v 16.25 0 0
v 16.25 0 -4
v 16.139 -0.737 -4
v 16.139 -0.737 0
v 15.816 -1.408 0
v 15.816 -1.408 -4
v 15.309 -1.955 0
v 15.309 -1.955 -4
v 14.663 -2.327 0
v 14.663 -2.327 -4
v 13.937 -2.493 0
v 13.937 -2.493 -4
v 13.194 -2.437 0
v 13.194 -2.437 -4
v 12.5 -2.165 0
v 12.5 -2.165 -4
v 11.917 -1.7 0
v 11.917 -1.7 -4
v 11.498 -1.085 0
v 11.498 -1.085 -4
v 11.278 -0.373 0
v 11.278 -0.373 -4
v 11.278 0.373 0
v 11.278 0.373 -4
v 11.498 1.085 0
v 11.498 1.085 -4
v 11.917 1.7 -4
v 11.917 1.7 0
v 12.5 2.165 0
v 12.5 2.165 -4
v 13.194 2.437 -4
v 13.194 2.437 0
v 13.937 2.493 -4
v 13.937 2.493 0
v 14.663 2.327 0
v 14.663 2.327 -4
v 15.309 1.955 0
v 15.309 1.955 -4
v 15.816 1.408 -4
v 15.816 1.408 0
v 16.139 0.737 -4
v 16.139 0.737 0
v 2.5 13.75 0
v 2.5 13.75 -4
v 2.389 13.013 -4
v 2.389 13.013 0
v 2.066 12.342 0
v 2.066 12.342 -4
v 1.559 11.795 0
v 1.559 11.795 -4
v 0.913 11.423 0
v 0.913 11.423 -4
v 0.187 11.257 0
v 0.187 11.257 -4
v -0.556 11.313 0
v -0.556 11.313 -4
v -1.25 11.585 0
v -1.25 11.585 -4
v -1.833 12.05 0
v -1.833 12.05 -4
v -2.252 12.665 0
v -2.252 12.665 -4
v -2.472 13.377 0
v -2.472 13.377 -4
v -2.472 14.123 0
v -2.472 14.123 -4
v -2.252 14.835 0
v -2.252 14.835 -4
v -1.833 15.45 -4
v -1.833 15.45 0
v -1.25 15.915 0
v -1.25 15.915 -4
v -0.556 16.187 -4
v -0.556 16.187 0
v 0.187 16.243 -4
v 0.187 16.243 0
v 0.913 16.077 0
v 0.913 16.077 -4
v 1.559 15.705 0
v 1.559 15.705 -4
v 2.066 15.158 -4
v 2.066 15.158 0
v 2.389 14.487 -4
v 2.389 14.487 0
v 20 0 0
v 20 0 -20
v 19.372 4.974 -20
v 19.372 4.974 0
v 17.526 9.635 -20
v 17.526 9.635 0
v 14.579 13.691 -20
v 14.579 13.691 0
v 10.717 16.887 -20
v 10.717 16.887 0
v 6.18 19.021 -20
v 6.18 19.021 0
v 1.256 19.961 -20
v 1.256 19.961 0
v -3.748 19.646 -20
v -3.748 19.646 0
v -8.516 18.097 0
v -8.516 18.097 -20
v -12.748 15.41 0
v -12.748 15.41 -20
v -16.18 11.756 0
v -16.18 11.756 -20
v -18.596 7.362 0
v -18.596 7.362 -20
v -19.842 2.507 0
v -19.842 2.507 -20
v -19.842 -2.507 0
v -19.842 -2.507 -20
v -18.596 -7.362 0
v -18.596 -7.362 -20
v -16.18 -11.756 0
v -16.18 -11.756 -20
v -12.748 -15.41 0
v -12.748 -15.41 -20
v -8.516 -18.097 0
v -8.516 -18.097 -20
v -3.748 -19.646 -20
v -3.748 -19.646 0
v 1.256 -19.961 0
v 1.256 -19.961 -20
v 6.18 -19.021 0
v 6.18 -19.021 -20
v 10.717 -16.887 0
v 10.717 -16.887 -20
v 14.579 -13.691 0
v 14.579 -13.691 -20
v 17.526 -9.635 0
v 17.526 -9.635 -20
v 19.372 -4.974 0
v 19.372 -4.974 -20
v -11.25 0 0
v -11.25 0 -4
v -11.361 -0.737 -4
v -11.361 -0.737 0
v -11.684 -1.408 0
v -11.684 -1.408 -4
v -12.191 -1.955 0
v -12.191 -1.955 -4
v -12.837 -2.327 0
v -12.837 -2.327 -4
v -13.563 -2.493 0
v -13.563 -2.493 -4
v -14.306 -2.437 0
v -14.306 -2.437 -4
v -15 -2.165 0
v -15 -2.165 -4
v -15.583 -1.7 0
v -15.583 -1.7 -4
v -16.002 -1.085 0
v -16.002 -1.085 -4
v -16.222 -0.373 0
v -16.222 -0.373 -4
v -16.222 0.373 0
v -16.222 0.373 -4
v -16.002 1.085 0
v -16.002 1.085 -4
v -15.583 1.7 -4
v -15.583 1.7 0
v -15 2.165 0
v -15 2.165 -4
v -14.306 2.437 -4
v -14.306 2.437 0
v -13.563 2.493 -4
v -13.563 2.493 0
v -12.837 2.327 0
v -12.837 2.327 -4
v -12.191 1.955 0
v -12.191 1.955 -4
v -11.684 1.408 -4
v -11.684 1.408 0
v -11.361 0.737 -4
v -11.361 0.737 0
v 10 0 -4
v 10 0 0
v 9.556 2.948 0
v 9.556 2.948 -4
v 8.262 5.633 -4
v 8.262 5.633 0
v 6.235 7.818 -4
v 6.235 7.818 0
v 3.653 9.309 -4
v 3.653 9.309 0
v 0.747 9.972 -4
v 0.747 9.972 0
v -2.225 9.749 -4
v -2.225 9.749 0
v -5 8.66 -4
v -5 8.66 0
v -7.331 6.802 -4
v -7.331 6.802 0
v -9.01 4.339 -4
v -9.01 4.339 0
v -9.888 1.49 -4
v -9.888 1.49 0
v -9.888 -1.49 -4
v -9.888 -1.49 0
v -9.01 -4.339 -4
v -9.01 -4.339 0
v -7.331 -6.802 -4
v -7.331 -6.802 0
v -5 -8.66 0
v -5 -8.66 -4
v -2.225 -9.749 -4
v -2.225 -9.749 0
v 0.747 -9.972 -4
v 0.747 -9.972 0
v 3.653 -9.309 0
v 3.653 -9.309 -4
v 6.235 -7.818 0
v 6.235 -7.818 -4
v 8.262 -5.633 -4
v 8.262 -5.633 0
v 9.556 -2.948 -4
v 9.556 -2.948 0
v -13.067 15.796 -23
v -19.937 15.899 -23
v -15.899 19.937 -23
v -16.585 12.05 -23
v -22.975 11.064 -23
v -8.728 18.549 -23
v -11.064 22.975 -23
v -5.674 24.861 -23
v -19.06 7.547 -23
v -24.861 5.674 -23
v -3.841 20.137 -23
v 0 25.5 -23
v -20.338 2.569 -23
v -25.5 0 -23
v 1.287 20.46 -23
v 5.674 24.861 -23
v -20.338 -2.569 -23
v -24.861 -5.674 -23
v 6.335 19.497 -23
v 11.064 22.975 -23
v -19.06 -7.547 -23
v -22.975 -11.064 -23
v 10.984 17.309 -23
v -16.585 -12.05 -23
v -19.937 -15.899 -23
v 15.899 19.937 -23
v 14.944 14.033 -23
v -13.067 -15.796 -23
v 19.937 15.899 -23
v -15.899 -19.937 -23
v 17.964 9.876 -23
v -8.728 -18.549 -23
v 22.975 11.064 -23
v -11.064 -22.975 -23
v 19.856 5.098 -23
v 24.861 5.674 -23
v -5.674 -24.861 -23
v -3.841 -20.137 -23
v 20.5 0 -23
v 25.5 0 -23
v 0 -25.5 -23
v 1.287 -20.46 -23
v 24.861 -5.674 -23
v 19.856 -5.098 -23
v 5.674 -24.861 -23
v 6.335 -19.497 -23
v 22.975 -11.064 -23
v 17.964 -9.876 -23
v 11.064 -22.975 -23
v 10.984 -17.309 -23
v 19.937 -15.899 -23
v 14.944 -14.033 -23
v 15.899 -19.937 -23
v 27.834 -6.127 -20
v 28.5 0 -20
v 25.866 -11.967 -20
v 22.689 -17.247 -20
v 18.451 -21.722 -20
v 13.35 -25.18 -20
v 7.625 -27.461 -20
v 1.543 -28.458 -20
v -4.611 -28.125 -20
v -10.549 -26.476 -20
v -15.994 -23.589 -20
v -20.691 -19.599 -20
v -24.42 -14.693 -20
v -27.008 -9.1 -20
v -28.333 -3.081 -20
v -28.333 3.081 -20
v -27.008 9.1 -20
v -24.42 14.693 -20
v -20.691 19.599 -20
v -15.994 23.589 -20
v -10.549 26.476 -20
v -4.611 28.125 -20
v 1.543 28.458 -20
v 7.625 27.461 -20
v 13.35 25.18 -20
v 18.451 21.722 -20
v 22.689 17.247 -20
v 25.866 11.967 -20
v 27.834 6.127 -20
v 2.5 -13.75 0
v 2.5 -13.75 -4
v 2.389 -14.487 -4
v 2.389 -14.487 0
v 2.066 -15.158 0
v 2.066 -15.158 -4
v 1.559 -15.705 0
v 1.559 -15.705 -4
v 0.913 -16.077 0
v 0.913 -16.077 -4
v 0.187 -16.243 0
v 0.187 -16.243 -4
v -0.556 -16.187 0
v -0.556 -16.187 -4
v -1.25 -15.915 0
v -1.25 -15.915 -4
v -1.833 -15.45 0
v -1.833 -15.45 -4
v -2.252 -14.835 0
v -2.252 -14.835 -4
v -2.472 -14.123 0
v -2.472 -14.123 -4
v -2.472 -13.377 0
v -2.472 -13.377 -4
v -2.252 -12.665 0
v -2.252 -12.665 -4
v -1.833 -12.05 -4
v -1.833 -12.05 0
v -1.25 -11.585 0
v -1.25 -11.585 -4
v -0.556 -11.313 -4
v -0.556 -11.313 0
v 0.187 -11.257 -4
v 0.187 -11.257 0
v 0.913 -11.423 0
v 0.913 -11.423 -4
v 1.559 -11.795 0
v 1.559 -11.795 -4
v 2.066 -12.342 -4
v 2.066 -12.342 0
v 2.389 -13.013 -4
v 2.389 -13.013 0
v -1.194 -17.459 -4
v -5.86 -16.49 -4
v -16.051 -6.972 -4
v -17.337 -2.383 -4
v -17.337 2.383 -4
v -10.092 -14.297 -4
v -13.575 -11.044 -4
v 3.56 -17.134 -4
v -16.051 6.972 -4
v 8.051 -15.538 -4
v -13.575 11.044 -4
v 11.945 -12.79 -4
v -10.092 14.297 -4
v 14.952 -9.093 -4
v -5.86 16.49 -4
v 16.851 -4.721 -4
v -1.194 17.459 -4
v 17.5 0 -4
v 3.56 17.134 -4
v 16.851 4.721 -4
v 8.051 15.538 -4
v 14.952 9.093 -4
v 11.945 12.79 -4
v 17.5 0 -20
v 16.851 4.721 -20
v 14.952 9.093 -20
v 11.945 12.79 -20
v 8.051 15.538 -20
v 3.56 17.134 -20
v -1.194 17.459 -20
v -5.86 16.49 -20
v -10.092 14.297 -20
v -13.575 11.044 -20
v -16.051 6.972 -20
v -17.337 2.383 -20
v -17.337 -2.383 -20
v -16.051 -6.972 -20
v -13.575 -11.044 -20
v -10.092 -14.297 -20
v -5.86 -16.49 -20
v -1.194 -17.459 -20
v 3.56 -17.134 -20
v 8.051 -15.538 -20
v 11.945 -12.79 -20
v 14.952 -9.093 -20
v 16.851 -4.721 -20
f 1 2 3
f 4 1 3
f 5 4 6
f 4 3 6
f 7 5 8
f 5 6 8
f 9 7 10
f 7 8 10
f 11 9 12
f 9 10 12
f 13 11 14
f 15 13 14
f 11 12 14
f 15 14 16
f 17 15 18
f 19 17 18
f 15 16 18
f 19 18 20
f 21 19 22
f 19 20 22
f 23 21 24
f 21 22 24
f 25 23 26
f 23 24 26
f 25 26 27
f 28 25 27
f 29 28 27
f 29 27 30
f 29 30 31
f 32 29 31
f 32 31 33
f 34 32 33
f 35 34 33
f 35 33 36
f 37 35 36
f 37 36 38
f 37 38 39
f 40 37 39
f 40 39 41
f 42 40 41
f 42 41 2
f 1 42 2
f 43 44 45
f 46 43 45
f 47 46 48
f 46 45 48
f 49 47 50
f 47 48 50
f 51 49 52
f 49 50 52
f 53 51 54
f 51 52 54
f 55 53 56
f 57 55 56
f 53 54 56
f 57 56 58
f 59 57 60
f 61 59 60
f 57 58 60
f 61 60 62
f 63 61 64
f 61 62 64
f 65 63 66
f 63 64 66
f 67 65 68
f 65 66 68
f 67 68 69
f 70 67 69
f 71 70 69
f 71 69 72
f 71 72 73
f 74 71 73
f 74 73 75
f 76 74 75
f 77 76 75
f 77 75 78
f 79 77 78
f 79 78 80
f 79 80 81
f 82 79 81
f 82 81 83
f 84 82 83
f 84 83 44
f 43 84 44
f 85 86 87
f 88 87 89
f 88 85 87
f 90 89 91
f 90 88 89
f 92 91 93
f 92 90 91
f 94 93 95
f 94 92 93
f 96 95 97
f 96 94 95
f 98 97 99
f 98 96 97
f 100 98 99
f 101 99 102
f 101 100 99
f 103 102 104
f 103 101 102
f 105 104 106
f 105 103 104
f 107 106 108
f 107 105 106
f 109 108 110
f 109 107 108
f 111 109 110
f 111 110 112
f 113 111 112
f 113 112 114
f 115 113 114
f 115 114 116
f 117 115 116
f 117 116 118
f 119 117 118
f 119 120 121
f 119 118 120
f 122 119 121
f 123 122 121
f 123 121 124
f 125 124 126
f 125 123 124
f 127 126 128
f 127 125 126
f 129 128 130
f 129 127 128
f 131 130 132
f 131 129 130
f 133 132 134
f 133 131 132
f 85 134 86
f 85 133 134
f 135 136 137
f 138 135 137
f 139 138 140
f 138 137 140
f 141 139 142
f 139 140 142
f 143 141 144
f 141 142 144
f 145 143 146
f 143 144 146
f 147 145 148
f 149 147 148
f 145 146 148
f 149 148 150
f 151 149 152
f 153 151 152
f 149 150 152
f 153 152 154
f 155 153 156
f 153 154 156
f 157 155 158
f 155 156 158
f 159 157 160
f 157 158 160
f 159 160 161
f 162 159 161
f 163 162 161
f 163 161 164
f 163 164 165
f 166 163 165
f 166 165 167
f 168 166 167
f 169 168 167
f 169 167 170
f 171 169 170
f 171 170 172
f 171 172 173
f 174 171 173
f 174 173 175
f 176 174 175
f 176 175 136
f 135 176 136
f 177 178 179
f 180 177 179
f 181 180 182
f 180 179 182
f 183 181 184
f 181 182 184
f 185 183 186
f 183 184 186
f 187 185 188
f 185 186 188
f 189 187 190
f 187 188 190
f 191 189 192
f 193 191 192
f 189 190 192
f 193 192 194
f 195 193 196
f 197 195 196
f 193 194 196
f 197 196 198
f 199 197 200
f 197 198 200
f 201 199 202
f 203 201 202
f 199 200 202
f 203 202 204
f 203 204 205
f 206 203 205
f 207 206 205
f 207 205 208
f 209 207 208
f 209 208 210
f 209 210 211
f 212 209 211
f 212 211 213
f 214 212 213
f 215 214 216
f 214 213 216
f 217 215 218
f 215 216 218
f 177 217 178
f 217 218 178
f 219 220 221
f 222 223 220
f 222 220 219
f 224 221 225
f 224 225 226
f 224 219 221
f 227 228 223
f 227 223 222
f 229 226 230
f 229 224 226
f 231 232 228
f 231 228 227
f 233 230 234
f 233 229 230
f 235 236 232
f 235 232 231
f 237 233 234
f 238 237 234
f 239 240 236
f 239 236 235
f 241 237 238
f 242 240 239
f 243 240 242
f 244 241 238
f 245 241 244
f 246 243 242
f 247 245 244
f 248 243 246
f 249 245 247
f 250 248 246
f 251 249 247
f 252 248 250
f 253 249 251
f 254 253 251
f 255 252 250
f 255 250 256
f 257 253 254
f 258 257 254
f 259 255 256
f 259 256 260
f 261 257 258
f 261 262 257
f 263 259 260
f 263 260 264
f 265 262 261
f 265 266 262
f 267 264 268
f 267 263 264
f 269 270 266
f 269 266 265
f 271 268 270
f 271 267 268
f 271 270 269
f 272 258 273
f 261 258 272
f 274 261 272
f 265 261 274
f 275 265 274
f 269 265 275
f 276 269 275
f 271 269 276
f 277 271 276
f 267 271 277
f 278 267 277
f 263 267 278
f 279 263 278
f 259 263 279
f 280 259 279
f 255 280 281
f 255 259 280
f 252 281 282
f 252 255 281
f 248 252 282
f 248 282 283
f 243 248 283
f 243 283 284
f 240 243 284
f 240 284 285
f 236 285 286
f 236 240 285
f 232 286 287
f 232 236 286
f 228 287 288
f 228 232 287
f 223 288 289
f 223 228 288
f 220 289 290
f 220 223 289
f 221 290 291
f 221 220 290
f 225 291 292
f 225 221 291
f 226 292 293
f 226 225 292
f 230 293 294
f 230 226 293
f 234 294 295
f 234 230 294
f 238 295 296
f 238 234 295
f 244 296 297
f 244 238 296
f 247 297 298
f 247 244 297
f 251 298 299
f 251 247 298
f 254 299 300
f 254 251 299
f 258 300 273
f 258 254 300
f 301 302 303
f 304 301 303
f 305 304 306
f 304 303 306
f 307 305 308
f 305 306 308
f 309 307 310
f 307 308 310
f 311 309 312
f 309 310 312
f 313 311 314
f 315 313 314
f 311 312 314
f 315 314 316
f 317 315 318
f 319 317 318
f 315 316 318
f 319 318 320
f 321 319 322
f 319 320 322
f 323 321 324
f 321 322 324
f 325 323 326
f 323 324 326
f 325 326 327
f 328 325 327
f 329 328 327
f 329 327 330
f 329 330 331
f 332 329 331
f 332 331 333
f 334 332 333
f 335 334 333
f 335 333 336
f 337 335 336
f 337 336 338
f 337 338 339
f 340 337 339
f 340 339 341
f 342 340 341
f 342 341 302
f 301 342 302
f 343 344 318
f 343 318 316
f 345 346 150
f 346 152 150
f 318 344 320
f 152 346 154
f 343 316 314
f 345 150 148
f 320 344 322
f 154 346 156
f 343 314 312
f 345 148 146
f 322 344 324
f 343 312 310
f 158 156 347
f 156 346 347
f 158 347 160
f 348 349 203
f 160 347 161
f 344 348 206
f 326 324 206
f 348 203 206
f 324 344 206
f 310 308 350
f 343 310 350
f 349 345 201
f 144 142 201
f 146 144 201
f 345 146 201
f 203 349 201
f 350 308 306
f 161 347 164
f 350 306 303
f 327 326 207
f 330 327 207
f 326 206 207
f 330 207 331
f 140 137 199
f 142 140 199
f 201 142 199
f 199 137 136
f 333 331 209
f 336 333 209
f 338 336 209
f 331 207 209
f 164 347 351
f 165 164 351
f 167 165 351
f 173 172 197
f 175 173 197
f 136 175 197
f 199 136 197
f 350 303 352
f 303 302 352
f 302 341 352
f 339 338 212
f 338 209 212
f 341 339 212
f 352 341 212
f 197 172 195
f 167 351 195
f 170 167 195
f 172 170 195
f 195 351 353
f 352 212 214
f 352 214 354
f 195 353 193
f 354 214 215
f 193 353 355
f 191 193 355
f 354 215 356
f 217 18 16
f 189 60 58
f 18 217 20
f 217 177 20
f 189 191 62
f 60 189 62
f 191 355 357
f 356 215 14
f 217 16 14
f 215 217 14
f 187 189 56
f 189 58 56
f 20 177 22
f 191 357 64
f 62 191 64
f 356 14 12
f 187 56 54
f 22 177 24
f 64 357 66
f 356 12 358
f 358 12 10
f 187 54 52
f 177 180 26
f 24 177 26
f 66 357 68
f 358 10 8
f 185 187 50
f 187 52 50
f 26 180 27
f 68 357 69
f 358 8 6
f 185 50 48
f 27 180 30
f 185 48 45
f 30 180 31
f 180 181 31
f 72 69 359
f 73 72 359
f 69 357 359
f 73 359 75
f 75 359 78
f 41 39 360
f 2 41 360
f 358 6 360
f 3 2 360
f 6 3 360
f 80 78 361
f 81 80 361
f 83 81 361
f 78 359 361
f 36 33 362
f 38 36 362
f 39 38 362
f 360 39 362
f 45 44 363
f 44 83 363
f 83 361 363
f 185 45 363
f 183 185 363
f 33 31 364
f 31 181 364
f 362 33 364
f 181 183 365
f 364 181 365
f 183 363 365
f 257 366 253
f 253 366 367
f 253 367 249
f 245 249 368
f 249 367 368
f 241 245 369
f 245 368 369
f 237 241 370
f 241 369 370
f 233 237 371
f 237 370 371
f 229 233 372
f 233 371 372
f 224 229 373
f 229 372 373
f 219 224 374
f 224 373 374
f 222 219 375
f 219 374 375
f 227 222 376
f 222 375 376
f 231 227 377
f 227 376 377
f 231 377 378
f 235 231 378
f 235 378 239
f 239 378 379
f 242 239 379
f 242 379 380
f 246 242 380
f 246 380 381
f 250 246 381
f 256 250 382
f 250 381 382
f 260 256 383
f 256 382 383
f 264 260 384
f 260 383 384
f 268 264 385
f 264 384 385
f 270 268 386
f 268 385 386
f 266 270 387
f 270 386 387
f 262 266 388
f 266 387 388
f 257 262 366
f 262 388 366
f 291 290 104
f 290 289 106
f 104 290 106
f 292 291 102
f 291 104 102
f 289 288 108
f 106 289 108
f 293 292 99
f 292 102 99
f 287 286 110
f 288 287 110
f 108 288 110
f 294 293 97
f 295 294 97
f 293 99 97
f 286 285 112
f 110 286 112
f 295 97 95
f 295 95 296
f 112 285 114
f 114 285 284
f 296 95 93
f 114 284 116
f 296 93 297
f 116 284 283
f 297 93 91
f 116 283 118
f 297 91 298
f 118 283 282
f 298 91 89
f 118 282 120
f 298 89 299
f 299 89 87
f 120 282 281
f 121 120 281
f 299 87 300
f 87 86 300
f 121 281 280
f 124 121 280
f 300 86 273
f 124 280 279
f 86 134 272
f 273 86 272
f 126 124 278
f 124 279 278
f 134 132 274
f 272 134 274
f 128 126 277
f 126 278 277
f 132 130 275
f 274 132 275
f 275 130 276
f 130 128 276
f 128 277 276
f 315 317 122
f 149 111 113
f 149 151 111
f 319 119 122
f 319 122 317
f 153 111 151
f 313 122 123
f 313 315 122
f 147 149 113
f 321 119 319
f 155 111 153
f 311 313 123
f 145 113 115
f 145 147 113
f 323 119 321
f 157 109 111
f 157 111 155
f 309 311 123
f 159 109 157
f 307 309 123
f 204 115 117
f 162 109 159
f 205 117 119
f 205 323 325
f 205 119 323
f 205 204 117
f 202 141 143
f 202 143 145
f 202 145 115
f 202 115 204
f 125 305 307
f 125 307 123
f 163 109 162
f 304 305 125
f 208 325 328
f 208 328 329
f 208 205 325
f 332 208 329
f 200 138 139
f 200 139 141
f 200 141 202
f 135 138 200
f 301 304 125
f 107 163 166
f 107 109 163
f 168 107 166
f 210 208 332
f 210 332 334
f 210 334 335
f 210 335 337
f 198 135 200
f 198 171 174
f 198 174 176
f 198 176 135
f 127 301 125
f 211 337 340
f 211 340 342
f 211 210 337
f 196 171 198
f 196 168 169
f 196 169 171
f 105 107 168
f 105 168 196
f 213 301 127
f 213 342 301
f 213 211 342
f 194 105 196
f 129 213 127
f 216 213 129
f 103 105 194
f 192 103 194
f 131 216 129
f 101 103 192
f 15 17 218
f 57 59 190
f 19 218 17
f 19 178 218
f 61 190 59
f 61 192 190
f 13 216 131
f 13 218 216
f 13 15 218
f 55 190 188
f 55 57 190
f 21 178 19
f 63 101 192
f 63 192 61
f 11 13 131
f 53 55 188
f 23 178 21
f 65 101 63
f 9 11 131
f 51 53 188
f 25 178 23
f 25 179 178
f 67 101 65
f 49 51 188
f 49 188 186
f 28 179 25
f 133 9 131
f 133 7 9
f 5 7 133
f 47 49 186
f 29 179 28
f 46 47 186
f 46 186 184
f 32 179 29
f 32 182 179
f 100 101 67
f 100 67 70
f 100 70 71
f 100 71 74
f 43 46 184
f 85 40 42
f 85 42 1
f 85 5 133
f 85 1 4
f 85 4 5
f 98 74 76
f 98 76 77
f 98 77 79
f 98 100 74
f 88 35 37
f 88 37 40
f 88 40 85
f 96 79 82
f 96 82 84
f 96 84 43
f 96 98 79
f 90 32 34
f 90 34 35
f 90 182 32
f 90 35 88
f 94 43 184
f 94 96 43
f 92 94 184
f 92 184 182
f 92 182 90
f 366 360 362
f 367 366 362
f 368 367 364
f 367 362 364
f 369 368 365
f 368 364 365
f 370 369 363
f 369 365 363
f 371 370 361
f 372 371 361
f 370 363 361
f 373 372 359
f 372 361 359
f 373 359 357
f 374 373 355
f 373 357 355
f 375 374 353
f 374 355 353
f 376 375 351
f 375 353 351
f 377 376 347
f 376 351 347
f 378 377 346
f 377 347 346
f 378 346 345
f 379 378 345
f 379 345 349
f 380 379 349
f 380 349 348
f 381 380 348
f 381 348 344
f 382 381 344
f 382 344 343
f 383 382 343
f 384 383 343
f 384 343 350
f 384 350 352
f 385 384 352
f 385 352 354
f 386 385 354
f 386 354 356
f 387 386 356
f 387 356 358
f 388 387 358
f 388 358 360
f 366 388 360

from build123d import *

# Parameters (mm, degrees)
F0_R     = 20
F0_R_2   = 17.5
F1_DEPTH = 23
F0_R_3   = 10
F2_DEPTH = 4
F3_R     = 28.5
F3_R_2   = 20
F4_DEPTH = 3
F5_R     = 2.5
F6_DEPTH = 4.001
F7_SIZE  = 2.99999
F8_SIZE  = 3


# Not quite as in the source:
# - a fillet or chamfer is up to 0.001 mm smaller than in the source, because OpenCascade refuses the exact size


with BuildPart() as f1:
    # F0 (on Top) → F1 (new body)
    with BuildSketch(Plane.XY):
        Circle(F0_R)
        Circle(F0_R_2, mode=Mode.SUBTRACT)
    extrude(amount=-F1_DEPTH)

    # F0 (on Top) → F2 (join)
    with BuildSketch(Plane.XY):
        Circle(F0_R_2)
        Circle(F0_R_3, mode=Mode.SUBTRACT)
    extrude(amount=-F2_DEPTH)

    # F3 (on face) → F4 (join)
    with BuildSketch(Plane(origin=(0, 0, -23), x_dir=(1, 0, 0), z_dir=(0, 0, -1))):
        Circle(F3_R)
        Circle(F3_R_2, mode=Mode.SUBTRACT)
    extrude(amount=-F4_DEPTH)

    # F5 (on face) → F6 (cut, through all)
    with BuildSketch(Plane(origin=(0, 0, -4), x_dir=(1, 0, 0), z_dir=(0, 0, -1))):
        with Locations((0, 13.75)):
            Circle(F5_R)
        with Locations((-13.75, 0)):
            Circle(F5_R)
        with Locations((0, -13.75)):
            Circle(F5_R)
        with Locations((13.75, 0)):
            Circle(F5_R)
    extrude(amount=-F6_DEPTH, mode=Mode.SUBTRACT)

    # F7 (size 3 in the source; OpenCascade refuses exactly that, so slightly less here)
    f7_edges = [f1.edges().sort_by_distance(p)[0] for p in [
        (-28.5, 0, -23),
    ]]
    chamfer(f7_edges, length=F7_SIZE)

    # F8
    f8_edges = [f1.edges().sort_by_distance(p)[0] for p in [
        (-17.5, 0, -23),
    ]]
    chamfer(f8_edges, length=F8_SIZE)


solid = f1.part
